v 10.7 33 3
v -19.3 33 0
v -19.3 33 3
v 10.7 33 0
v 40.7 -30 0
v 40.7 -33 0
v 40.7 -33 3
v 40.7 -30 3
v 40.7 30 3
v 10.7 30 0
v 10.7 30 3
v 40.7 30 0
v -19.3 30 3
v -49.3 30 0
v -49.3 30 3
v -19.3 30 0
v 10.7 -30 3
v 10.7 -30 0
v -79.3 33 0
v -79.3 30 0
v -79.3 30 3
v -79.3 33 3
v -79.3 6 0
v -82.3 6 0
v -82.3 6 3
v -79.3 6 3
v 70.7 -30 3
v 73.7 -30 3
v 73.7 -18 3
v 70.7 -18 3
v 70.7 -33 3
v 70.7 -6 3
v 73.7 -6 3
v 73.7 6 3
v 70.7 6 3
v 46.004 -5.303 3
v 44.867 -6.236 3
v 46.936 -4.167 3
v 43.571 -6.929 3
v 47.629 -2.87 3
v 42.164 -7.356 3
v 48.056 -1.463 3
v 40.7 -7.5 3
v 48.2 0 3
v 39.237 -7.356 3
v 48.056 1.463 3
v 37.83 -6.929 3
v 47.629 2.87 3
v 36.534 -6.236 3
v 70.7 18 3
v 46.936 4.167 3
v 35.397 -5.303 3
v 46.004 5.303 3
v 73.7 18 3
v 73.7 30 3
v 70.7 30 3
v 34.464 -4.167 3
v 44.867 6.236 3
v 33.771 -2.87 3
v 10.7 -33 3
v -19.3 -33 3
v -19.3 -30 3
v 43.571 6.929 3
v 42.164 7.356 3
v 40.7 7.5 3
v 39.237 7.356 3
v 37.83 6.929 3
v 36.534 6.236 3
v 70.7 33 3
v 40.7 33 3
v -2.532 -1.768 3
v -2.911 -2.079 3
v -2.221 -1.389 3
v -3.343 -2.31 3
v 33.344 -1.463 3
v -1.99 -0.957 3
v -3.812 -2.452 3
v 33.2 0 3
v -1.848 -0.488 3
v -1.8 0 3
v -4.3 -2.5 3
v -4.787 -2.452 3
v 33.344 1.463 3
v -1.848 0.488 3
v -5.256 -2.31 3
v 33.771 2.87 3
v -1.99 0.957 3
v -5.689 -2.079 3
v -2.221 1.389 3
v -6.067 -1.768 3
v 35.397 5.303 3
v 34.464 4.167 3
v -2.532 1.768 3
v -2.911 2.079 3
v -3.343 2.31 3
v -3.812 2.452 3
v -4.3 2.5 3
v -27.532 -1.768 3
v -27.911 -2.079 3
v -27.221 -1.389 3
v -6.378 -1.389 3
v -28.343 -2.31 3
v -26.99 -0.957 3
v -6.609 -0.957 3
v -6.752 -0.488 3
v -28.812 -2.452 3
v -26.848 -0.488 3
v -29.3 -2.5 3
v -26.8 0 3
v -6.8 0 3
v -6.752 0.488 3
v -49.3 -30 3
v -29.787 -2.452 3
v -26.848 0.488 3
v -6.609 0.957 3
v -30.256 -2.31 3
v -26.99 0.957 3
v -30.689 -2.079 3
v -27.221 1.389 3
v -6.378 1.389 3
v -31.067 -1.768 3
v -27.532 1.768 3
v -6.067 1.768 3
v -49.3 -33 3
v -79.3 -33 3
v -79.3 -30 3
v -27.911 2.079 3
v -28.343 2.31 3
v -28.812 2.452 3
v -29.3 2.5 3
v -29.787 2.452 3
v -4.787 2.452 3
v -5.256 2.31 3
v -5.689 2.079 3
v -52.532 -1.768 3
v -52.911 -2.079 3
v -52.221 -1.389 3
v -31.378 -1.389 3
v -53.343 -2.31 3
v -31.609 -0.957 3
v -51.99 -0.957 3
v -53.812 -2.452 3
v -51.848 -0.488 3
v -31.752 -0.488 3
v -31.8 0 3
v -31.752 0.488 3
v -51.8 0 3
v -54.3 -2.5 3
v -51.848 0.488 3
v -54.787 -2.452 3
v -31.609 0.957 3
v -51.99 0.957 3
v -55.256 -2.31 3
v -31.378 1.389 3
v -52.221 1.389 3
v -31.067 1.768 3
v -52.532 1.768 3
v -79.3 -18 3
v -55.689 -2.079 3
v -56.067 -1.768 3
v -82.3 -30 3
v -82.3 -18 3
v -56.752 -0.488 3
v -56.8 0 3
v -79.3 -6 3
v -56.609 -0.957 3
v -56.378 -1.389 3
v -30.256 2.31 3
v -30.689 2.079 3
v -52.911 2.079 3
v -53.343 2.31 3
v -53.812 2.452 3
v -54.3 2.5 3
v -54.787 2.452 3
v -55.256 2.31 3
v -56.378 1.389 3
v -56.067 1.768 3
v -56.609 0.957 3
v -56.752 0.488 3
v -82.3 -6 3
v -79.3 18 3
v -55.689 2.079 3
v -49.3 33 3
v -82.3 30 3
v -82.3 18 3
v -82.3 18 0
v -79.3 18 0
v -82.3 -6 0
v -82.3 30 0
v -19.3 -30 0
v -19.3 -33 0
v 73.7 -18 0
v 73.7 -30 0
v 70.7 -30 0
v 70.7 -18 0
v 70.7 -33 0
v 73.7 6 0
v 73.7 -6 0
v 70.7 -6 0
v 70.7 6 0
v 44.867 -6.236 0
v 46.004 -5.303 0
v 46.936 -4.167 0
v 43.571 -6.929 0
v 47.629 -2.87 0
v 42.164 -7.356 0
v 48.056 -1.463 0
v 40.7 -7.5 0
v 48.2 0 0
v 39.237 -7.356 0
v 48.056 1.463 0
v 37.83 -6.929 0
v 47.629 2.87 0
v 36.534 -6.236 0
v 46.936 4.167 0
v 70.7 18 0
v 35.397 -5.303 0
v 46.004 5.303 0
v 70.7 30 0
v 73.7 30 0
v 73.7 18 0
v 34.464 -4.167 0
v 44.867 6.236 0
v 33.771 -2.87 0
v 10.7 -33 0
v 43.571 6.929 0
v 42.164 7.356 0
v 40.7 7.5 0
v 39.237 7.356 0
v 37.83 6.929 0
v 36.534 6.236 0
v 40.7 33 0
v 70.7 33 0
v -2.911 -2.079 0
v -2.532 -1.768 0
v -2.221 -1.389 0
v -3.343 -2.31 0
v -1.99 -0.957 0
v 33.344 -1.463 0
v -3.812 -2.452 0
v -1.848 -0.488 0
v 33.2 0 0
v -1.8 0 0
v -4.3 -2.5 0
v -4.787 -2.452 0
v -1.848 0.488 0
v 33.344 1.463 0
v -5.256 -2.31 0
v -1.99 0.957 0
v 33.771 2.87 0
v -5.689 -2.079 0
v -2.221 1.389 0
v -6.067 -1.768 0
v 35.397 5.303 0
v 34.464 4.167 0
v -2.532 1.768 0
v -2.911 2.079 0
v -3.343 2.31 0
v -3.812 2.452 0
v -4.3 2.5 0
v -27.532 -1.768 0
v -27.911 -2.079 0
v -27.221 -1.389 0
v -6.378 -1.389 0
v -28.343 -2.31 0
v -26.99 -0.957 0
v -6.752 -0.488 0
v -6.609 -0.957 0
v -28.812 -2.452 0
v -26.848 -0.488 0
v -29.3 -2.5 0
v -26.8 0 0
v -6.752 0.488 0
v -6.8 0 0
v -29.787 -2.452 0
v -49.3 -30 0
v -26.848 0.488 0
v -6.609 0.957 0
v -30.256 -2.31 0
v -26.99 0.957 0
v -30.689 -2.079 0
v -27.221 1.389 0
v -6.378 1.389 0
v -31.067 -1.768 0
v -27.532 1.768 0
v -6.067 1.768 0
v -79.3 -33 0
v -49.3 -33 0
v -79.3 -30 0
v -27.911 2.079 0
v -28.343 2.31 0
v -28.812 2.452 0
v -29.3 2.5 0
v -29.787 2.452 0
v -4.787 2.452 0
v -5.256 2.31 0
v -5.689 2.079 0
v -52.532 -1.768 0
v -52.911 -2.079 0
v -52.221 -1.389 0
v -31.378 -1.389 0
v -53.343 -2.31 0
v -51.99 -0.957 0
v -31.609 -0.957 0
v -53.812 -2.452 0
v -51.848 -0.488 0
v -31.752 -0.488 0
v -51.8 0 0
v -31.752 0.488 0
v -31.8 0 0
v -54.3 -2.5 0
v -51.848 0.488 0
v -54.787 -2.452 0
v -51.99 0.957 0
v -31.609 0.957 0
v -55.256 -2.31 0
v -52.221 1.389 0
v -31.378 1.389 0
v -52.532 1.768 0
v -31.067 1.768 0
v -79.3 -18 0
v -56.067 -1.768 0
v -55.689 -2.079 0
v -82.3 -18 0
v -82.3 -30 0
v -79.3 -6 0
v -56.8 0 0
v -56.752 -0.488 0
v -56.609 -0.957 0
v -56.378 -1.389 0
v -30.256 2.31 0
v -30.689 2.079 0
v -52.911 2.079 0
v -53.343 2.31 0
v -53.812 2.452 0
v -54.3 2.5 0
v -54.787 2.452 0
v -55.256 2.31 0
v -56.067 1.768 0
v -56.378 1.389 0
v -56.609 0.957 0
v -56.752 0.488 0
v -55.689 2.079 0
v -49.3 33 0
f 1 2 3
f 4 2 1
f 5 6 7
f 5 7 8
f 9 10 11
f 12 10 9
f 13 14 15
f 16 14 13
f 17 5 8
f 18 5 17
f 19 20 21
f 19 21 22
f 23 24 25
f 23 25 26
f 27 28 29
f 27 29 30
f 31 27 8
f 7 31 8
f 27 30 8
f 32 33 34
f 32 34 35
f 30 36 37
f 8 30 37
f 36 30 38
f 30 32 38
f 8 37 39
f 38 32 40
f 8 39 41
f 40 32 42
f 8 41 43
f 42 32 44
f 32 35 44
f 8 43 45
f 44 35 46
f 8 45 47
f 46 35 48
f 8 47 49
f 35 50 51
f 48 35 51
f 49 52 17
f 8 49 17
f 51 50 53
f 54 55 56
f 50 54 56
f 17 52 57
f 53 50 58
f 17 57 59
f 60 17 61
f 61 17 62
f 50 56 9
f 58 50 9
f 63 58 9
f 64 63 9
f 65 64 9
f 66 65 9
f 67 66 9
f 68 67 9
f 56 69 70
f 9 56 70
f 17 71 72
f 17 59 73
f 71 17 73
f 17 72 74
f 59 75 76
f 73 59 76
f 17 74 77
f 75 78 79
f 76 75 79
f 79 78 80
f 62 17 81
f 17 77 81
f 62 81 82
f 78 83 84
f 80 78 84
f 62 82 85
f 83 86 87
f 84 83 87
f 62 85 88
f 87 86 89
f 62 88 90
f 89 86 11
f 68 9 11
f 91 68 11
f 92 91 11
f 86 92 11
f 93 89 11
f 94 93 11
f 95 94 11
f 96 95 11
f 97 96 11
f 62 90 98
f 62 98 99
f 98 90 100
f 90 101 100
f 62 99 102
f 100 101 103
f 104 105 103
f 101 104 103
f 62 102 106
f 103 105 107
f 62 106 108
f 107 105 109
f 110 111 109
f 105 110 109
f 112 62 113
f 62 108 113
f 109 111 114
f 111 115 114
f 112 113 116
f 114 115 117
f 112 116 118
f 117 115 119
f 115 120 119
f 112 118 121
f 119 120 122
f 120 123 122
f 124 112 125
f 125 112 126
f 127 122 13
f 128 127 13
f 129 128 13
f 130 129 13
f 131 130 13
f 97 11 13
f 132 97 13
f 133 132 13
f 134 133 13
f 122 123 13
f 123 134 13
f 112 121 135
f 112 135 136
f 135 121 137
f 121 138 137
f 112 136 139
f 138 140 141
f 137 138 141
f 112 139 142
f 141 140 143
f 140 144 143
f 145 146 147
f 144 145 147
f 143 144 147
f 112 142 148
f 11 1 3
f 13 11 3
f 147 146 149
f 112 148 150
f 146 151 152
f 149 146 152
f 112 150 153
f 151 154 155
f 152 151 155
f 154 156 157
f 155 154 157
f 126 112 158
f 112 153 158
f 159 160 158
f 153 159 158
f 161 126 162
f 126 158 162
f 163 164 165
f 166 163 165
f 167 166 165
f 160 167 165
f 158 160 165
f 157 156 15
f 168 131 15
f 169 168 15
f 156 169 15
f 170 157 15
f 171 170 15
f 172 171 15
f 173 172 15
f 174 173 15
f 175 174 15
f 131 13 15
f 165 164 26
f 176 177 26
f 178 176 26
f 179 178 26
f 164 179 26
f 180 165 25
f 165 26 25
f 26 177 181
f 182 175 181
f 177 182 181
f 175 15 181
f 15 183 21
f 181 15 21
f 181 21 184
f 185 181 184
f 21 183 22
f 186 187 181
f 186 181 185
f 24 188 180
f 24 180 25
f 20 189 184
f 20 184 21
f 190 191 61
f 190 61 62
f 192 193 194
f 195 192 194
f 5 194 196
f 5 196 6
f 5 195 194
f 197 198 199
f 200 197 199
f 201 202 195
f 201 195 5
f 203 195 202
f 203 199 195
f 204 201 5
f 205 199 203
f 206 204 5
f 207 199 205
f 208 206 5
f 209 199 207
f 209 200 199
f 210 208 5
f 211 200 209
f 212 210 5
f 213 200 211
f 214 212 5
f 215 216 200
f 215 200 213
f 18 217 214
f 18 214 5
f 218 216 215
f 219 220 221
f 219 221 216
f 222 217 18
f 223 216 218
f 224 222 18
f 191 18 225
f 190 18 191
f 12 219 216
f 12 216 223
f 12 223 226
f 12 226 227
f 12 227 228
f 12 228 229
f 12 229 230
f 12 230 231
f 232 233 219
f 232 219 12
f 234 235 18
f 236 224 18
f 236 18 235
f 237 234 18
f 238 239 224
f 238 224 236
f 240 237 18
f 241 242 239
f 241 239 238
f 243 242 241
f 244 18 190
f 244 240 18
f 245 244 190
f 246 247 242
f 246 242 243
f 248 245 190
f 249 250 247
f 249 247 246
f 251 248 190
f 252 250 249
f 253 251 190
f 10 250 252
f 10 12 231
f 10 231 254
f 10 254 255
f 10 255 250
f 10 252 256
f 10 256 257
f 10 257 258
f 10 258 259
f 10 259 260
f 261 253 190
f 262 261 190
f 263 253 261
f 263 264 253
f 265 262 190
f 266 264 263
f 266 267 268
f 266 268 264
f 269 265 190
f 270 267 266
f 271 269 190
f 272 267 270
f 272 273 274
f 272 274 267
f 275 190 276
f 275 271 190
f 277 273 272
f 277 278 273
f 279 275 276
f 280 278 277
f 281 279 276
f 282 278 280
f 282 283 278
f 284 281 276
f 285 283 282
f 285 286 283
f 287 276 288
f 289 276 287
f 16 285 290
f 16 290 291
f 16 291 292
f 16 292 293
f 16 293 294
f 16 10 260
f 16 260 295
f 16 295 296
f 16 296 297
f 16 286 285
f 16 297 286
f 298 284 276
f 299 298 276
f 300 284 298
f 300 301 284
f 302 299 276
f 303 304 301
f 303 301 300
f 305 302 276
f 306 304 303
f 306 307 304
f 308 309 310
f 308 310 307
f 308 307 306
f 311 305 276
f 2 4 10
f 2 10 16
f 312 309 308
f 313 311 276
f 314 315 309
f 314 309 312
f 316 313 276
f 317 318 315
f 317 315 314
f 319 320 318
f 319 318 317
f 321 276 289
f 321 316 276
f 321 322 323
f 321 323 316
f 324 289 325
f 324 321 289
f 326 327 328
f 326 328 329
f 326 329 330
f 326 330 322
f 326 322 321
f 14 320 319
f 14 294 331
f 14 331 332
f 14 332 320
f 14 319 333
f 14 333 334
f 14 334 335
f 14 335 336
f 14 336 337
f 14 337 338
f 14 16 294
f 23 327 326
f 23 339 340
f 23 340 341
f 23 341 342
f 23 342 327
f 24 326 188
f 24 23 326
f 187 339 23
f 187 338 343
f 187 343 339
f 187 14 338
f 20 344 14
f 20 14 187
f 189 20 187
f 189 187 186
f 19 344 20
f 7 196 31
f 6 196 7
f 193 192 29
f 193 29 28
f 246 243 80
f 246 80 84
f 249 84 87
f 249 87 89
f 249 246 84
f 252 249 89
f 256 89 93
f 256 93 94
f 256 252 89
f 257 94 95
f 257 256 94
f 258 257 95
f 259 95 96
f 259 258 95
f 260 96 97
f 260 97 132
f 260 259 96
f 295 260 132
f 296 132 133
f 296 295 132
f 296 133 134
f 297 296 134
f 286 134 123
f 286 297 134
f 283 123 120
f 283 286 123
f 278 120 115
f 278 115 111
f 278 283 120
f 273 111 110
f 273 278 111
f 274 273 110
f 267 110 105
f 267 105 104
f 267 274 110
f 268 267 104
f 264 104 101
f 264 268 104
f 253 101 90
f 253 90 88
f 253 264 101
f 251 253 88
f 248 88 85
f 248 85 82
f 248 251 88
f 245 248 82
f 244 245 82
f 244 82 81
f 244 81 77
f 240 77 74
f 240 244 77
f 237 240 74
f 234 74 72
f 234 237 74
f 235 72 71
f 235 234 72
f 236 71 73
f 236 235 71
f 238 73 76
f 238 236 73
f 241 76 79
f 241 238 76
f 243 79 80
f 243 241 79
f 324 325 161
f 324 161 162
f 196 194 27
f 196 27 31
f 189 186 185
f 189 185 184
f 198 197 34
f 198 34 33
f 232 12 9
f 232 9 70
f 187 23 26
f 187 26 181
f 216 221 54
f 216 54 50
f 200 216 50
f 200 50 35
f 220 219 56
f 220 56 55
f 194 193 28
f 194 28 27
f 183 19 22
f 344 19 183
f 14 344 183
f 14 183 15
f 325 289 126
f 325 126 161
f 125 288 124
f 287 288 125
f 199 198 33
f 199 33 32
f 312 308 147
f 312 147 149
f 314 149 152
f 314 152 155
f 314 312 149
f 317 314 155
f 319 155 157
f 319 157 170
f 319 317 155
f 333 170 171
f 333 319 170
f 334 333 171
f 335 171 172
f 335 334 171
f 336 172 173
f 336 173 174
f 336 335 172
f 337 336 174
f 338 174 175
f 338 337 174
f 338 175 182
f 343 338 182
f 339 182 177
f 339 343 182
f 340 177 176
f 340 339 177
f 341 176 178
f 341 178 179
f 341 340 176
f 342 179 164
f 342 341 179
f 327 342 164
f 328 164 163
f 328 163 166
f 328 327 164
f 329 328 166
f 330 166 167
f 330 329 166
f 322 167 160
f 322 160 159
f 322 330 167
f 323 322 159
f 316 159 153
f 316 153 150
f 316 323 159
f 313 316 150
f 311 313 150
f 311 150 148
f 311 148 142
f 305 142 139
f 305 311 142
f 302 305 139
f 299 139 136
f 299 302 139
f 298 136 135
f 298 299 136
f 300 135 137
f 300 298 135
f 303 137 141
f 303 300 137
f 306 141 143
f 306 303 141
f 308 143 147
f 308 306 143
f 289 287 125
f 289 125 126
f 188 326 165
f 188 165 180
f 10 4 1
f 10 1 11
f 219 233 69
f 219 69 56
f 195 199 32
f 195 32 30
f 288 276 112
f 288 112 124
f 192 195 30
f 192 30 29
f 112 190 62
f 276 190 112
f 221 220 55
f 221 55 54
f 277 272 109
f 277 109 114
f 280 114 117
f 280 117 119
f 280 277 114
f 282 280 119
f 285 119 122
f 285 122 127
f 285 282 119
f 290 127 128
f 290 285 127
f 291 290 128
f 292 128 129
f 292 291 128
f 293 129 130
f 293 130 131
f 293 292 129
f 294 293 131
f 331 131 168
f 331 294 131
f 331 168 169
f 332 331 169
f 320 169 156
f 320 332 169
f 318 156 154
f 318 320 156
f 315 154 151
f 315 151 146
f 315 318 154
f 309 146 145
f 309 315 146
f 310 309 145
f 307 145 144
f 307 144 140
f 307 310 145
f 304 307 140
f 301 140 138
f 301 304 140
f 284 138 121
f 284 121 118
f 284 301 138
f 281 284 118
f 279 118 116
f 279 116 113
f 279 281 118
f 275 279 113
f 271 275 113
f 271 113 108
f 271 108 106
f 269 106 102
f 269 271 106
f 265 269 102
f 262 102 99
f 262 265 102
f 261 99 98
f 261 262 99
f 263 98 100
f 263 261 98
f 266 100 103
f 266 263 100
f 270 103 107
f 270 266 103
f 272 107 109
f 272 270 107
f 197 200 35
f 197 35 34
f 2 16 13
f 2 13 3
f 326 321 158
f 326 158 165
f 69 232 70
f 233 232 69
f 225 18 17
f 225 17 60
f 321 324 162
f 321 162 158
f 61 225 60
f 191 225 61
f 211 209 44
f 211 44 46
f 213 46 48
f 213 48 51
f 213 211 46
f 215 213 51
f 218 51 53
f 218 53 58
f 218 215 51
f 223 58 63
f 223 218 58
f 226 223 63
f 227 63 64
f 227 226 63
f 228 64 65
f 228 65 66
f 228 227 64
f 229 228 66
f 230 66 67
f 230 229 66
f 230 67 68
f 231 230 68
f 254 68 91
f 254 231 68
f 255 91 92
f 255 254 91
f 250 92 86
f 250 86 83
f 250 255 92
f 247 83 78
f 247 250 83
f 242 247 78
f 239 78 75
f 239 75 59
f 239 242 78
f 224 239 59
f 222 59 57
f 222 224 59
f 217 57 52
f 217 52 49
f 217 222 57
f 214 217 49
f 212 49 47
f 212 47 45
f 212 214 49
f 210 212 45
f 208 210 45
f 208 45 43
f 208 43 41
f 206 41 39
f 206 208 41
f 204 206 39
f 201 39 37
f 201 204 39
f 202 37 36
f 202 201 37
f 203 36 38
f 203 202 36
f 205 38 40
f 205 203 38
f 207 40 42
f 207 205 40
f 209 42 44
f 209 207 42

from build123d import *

# Parameters (mm, degrees)
ESBO_O1_R                = 2.5
ESBO_O1_R_2              = 7.5
RESSALTO_EXTRUS_O1_DEPTH = 3


with BuildPart() as part:
    # Esboço1 → Ressalto-extrusão1 (new body)
    with BuildSketch(Plane.XY):
        Polygon((40.700385396, -30), (10.700385396, -30), (10.700385396, -33), (-19.299614604, -33), (-19.299614604, -30), (-49.299614604, -30), (-49.299614604, -33), (-79.299614604, -33), (-79.299614604, -30), (-82.299614604, -30), (-82.299614604, -18), (-79.299614604, -18), (-79.299614604, -6), (-82.299614604, -6), (-82.299614604, 6), (-79.299614604, 6), (-79.299614604, 18), (-82.299614604, 18), (-82.299614604, 30), (-79.299614604, 30), (-79.299614604, 33), (-49.299614604, 33), (-49.299614604, 30), (-19.299614604, 30), (-19.299614604, 33), (10.700385396, 33), (10.700385396, 30), (40.700385396, 30), (40.700385396, 33), (70.700385396, 33), (70.700385396, 30), (73.700385396, 30), (73.700385396, 18), (70.700385396, 18), (70.700385396, 6), (73.700385396, 6), (73.700385396, -6), (70.700385396, -6), (70.700385396, -18), (73.700385396, -18), (73.700385396, -30), (70.700385396, -30), (70.700385396, -33), (40.700385396, -33), align=None)
        with Locations((-54.299614604, 0)):
            Circle(ESBO_O1_R, mode=Mode.SUBTRACT)
        with Locations((-29.299614604, 0)):
            Circle(ESBO_O1_R, mode=Mode.SUBTRACT)
        with Locations((-4.299614604, 0)):
            Circle(ESBO_O1_R, mode=Mode.SUBTRACT)
        with Locations((40.700385396, 0)):
            Circle(ESBO_O1_R_2, mode=Mode.SUBTRACT)
    extrude(amount=RESSALTO_EXTRUS_O1_DEPTH)


solid = part.part
